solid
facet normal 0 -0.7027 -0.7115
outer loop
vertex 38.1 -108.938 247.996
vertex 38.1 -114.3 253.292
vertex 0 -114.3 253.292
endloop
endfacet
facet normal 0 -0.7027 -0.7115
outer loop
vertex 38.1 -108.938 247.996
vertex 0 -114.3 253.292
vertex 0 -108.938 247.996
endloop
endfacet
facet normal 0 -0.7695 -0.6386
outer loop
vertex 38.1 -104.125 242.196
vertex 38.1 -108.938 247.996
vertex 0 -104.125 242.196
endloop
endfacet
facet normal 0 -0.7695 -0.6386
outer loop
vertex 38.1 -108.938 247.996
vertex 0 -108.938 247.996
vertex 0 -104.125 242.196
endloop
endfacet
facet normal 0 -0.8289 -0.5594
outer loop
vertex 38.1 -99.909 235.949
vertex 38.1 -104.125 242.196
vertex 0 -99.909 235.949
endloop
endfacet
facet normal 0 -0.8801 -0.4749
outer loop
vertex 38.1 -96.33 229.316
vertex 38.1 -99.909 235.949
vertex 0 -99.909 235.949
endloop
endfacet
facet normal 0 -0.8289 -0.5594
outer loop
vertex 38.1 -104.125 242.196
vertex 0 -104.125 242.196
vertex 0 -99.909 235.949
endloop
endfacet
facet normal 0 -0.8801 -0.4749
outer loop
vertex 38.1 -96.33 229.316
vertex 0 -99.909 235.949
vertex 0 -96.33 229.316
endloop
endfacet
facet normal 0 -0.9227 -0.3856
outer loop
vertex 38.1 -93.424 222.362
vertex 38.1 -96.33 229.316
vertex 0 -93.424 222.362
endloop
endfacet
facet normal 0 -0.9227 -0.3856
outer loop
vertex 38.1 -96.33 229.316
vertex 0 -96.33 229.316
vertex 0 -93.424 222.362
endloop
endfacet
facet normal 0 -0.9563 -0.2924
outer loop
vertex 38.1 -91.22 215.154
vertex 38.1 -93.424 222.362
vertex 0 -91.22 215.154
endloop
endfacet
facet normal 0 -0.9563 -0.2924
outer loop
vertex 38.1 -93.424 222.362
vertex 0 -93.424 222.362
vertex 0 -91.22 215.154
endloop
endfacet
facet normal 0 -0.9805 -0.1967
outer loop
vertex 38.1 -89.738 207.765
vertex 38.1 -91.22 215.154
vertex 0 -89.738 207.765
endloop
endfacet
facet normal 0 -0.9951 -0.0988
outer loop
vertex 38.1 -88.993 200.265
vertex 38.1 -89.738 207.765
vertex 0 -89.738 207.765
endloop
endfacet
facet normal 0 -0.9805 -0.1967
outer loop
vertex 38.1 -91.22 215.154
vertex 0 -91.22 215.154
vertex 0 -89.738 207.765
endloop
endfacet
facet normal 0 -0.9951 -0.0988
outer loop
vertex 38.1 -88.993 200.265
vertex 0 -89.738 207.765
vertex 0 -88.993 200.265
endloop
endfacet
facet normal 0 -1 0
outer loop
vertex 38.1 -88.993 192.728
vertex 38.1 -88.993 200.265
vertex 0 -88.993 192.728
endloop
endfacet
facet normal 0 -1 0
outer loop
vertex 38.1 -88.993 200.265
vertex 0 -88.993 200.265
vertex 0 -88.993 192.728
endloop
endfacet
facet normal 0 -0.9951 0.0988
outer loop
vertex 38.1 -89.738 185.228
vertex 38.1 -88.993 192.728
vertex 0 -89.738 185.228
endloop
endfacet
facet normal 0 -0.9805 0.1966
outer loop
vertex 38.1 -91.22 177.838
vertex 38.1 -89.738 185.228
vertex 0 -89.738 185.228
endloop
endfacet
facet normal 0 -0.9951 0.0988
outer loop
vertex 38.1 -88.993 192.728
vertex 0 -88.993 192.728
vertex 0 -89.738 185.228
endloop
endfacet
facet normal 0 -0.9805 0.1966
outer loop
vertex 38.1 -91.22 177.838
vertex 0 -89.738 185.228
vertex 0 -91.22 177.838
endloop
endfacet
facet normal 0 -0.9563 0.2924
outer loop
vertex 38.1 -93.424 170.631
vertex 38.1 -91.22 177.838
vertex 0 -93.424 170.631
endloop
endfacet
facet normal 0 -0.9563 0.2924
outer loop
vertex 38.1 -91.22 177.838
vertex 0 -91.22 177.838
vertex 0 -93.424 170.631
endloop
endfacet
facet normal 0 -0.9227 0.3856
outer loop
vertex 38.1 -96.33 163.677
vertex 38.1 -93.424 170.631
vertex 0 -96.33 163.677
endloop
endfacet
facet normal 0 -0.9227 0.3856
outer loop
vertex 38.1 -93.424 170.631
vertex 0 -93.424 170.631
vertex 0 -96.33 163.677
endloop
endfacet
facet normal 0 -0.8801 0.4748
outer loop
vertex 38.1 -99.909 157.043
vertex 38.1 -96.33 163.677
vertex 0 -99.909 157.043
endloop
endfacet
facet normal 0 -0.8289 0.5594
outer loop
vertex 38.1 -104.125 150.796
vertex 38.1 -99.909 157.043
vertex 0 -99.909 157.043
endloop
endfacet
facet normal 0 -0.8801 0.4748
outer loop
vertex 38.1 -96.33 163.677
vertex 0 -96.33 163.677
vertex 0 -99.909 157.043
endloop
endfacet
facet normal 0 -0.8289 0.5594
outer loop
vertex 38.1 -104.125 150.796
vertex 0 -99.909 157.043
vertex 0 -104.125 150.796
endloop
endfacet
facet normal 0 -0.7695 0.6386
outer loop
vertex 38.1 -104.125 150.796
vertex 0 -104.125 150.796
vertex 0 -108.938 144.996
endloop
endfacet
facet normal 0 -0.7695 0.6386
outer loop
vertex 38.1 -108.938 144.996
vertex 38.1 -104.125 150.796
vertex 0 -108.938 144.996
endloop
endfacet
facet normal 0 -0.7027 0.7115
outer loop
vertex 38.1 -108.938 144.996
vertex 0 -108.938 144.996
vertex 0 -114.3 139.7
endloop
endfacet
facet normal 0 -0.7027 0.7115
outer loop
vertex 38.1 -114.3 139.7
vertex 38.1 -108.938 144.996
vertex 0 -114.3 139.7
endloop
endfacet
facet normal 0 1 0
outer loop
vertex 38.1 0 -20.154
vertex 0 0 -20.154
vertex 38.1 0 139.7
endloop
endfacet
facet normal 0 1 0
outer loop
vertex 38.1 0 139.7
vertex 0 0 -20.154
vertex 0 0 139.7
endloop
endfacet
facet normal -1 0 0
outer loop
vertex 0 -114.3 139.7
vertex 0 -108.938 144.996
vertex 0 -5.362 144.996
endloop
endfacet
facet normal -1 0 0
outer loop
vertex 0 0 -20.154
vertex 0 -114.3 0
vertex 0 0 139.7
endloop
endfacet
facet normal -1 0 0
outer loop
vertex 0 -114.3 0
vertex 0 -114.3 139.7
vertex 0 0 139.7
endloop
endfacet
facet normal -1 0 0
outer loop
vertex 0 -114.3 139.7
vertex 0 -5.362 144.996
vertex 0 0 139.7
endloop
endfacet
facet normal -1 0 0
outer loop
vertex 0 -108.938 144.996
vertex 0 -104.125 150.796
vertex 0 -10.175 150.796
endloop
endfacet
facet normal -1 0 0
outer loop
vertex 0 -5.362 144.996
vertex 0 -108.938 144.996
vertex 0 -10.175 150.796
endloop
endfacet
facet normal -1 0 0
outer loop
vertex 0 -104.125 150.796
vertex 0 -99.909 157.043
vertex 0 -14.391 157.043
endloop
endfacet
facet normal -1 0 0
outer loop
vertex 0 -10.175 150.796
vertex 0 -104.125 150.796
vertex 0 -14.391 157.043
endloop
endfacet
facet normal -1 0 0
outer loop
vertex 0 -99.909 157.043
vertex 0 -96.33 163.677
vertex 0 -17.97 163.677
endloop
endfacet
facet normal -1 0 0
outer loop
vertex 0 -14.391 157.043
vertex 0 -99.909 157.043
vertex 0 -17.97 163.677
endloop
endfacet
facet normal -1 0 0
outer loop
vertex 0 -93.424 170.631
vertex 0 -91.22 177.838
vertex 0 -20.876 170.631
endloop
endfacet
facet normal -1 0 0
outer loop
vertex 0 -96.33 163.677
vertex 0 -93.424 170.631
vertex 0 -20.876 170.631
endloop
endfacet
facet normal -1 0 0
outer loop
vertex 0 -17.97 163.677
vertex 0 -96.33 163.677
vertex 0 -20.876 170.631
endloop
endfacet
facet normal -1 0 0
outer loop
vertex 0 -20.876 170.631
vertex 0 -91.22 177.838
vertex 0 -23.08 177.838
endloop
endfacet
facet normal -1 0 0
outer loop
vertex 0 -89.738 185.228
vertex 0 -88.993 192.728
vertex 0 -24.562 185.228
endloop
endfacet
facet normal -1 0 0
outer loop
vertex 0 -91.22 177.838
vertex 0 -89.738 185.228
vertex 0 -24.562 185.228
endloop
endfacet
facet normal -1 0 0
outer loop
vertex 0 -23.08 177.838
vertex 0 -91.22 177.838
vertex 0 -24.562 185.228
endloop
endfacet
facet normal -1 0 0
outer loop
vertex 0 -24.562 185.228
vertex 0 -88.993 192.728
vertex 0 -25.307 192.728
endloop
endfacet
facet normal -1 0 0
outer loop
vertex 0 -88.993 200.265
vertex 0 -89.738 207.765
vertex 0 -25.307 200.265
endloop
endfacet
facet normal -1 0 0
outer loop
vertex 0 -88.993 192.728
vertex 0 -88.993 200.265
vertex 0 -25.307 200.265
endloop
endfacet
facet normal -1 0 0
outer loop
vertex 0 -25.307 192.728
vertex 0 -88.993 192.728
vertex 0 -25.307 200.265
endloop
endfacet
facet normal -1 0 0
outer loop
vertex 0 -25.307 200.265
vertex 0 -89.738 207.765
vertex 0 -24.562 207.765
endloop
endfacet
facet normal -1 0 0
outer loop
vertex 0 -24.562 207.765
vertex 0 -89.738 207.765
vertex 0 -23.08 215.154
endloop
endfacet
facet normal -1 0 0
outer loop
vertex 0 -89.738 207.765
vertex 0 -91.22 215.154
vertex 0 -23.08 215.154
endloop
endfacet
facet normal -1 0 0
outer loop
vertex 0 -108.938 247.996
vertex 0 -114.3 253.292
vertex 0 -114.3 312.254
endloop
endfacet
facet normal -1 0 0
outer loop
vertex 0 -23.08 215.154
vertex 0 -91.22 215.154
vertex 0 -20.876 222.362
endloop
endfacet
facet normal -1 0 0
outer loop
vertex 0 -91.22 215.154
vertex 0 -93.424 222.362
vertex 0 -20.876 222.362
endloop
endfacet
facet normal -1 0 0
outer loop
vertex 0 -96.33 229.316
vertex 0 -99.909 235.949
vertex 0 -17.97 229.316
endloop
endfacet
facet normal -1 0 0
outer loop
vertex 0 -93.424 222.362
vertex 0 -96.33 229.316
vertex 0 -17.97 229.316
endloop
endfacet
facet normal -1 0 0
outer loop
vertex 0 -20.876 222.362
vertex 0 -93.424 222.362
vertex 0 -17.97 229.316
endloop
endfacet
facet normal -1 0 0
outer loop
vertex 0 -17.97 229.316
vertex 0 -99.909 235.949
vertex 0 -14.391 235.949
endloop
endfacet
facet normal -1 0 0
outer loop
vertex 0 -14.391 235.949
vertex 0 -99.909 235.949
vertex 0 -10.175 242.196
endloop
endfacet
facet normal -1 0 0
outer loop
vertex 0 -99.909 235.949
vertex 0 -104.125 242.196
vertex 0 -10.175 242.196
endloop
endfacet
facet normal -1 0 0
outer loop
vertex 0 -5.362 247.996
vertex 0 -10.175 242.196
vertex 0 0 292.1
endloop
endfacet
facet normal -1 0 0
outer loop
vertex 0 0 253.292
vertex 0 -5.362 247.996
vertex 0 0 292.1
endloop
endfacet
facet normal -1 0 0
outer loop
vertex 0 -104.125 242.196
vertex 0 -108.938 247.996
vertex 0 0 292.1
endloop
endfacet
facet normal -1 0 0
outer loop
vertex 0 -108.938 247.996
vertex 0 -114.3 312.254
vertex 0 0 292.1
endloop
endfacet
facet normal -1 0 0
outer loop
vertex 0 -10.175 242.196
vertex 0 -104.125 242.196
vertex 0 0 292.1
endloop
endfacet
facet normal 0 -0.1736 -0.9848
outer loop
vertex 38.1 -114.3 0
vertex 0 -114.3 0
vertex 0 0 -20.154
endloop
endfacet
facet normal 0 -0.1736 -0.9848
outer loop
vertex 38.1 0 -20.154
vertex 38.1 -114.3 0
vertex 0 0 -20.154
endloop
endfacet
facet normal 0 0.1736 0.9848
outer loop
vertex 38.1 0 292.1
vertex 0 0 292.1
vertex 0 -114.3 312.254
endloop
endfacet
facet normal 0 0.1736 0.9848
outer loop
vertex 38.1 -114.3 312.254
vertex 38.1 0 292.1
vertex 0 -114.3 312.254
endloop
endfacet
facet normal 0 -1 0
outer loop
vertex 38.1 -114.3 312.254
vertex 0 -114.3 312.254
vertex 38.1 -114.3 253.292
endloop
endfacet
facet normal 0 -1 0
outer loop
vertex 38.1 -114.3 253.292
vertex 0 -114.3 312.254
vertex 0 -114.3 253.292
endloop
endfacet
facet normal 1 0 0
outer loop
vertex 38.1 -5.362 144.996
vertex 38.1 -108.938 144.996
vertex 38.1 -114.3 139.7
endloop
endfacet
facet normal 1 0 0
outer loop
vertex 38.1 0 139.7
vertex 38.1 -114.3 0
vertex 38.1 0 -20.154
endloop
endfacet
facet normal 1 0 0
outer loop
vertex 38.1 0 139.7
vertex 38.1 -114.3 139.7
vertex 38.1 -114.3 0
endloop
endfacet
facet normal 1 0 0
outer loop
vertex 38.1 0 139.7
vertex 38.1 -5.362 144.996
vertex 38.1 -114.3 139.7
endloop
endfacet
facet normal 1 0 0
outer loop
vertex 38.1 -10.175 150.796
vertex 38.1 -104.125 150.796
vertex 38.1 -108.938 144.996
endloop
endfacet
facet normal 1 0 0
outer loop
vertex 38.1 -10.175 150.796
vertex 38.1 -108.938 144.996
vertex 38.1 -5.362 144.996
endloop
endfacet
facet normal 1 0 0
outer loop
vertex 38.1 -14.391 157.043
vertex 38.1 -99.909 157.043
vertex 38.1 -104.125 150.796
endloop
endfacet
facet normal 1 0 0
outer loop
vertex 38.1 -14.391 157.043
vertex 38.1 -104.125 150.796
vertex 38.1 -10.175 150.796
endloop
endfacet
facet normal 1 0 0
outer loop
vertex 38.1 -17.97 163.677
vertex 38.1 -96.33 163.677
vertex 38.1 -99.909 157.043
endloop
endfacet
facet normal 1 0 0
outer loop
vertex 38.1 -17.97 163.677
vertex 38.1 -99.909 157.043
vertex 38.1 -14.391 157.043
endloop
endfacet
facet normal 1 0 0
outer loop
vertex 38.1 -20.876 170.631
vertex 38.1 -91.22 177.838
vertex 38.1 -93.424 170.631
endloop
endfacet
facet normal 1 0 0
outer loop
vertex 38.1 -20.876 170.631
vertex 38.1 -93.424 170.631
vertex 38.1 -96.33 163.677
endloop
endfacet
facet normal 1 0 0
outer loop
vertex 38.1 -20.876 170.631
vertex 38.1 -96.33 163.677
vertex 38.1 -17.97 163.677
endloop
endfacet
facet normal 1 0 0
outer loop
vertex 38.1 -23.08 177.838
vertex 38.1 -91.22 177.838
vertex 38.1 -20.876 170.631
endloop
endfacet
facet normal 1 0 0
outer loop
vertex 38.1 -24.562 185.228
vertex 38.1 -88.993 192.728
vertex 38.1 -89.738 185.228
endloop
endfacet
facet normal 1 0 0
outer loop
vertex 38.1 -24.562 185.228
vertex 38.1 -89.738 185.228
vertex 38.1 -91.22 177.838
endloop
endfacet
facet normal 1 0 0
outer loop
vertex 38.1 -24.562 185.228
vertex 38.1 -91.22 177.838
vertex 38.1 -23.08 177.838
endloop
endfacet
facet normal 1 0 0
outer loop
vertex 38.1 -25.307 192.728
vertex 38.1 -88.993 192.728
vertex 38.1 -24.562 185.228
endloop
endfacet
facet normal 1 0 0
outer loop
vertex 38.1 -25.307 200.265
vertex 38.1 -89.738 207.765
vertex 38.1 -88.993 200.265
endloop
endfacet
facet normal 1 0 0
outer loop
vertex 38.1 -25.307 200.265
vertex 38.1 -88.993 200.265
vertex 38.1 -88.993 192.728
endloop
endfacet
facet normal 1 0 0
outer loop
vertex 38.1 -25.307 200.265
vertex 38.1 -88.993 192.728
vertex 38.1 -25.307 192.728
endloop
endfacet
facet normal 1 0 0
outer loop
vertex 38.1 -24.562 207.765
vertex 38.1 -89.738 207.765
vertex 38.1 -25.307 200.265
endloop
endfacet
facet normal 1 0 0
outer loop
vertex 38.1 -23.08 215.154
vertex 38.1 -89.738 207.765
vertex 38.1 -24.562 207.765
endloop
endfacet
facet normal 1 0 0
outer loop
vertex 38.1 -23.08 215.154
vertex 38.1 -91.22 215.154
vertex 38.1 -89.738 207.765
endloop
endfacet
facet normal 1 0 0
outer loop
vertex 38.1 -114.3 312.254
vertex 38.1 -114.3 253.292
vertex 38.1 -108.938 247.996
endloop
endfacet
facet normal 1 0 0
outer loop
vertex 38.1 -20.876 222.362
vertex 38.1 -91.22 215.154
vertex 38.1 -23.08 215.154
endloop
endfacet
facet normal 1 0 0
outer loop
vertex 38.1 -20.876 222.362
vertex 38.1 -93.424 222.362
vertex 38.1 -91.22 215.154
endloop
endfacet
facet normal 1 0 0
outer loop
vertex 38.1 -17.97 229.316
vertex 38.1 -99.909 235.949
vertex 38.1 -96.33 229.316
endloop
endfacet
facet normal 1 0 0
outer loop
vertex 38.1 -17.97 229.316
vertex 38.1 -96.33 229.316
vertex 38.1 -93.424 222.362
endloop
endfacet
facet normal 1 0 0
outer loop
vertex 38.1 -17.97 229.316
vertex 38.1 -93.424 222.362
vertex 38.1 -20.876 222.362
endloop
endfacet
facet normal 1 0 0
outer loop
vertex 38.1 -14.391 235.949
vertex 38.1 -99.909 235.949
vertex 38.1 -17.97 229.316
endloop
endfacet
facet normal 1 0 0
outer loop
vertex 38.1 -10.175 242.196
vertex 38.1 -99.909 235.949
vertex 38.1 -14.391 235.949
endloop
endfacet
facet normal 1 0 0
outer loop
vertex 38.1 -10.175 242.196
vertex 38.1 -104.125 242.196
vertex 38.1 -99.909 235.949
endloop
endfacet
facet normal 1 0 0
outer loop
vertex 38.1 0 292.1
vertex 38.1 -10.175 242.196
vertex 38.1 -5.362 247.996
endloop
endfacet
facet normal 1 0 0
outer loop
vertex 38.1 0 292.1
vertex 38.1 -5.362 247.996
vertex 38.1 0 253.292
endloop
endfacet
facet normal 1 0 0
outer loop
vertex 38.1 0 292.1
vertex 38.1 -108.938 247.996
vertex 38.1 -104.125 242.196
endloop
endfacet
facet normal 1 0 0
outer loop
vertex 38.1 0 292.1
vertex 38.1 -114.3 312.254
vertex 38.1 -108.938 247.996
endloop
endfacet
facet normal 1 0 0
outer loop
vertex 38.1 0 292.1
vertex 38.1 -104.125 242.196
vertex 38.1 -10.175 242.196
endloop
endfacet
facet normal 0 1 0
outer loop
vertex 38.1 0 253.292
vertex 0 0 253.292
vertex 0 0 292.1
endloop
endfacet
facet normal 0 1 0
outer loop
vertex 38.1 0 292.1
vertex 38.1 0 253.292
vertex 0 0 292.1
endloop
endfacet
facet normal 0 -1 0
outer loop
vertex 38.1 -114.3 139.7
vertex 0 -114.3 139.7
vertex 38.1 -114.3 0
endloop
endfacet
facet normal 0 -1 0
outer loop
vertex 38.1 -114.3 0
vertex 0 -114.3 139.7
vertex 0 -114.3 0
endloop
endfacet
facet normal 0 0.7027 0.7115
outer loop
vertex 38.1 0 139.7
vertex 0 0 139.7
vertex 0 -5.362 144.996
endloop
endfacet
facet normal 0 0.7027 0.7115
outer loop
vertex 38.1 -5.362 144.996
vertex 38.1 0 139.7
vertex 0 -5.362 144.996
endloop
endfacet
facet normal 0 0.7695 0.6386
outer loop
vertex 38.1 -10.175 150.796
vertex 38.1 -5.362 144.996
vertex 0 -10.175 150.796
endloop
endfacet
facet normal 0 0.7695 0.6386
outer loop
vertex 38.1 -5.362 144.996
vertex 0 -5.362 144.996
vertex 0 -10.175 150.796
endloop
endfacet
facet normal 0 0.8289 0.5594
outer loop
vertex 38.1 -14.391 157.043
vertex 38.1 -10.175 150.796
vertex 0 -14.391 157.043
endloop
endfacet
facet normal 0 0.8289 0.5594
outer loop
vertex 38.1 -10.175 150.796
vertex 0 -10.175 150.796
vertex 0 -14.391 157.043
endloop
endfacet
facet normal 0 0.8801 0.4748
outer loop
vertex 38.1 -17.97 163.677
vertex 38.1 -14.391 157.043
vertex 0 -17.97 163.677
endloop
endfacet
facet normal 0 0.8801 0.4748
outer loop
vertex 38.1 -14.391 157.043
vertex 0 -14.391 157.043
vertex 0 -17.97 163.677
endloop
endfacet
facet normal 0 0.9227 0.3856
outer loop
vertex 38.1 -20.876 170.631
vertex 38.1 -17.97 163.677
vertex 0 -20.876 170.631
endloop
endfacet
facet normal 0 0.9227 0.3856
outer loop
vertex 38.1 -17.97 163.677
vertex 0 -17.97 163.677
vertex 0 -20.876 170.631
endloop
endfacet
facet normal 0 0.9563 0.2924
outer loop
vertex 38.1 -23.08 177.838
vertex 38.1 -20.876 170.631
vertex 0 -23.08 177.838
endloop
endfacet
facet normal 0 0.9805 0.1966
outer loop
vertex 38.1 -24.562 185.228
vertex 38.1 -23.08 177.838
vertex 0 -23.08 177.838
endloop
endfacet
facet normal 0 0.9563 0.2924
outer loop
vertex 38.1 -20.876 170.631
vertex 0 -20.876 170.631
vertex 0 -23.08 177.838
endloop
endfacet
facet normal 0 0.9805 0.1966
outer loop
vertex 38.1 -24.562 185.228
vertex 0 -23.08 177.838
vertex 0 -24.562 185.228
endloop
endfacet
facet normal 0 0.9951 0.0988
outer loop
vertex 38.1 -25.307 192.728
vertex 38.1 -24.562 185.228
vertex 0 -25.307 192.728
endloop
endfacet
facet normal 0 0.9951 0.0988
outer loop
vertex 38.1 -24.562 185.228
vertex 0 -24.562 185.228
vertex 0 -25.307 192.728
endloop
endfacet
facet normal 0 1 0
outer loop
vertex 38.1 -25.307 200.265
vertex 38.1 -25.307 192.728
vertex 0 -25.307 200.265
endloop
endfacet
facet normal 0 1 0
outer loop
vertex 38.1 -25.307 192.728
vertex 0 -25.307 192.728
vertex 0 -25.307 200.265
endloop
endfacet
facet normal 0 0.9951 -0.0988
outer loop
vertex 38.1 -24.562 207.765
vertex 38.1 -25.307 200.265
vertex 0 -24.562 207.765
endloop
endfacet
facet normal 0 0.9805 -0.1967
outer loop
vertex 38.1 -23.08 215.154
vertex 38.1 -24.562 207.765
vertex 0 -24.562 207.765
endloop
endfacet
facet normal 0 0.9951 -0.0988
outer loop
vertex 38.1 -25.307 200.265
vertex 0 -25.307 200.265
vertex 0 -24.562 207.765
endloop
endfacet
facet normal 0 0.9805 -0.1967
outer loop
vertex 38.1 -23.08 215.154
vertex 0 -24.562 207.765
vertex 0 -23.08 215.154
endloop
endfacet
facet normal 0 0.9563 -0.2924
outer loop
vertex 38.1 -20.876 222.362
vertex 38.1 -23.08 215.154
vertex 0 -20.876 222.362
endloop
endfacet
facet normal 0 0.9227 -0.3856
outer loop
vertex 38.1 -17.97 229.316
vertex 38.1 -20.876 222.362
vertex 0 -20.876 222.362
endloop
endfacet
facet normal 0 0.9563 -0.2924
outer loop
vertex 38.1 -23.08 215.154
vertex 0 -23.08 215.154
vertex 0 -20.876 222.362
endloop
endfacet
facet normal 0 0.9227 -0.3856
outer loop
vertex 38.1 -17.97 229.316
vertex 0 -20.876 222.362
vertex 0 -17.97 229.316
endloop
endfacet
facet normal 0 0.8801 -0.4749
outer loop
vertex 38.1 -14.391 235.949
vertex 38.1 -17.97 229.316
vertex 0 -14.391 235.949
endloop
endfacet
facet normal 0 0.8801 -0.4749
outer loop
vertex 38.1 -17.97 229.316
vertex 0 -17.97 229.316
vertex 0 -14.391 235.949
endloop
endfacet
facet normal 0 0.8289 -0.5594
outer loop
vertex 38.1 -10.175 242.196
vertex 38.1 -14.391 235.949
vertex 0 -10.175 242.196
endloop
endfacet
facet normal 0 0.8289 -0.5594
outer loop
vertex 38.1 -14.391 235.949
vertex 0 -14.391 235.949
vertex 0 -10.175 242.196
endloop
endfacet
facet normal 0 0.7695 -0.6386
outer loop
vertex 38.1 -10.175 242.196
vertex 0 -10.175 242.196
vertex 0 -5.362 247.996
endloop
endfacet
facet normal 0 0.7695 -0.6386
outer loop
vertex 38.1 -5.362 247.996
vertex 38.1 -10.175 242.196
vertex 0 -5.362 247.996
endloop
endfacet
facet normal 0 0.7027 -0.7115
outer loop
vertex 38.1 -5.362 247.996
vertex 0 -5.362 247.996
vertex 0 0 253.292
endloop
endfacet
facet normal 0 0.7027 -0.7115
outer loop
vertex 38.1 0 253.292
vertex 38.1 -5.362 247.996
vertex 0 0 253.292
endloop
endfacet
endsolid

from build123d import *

# Parameters (mm, degrees)
F1_DEPTH = 38.1


with BuildPart() as f1:
    # F0 (on Right) → F1 (new body)
    with BuildSketch(Plane.YZ):
        with BuildLine():
            Line((-114.3, 0), (0, -20.154174))
            Line((0, -20.154174), (0, 139.7))
            ThreePointArc((0, 139.7), (-25.4, 196.496127), (0, 253.292253))
            Line((0, 253.292253), (0, 292.1))
            Line((0, 292.1), (-114.3, 312.254174))
            Line((-114.3, 312.254174), (-114.3, 253.292253))
            ThreePointArc((-114.3, 253.292253), (-88.9, 196.496127), (-114.3, 139.7))
            Line((-114.3, 139.7), (-114.3, 0))
        make_face()
    extrude(amount=F1_DEPTH)


solid = f1.part
